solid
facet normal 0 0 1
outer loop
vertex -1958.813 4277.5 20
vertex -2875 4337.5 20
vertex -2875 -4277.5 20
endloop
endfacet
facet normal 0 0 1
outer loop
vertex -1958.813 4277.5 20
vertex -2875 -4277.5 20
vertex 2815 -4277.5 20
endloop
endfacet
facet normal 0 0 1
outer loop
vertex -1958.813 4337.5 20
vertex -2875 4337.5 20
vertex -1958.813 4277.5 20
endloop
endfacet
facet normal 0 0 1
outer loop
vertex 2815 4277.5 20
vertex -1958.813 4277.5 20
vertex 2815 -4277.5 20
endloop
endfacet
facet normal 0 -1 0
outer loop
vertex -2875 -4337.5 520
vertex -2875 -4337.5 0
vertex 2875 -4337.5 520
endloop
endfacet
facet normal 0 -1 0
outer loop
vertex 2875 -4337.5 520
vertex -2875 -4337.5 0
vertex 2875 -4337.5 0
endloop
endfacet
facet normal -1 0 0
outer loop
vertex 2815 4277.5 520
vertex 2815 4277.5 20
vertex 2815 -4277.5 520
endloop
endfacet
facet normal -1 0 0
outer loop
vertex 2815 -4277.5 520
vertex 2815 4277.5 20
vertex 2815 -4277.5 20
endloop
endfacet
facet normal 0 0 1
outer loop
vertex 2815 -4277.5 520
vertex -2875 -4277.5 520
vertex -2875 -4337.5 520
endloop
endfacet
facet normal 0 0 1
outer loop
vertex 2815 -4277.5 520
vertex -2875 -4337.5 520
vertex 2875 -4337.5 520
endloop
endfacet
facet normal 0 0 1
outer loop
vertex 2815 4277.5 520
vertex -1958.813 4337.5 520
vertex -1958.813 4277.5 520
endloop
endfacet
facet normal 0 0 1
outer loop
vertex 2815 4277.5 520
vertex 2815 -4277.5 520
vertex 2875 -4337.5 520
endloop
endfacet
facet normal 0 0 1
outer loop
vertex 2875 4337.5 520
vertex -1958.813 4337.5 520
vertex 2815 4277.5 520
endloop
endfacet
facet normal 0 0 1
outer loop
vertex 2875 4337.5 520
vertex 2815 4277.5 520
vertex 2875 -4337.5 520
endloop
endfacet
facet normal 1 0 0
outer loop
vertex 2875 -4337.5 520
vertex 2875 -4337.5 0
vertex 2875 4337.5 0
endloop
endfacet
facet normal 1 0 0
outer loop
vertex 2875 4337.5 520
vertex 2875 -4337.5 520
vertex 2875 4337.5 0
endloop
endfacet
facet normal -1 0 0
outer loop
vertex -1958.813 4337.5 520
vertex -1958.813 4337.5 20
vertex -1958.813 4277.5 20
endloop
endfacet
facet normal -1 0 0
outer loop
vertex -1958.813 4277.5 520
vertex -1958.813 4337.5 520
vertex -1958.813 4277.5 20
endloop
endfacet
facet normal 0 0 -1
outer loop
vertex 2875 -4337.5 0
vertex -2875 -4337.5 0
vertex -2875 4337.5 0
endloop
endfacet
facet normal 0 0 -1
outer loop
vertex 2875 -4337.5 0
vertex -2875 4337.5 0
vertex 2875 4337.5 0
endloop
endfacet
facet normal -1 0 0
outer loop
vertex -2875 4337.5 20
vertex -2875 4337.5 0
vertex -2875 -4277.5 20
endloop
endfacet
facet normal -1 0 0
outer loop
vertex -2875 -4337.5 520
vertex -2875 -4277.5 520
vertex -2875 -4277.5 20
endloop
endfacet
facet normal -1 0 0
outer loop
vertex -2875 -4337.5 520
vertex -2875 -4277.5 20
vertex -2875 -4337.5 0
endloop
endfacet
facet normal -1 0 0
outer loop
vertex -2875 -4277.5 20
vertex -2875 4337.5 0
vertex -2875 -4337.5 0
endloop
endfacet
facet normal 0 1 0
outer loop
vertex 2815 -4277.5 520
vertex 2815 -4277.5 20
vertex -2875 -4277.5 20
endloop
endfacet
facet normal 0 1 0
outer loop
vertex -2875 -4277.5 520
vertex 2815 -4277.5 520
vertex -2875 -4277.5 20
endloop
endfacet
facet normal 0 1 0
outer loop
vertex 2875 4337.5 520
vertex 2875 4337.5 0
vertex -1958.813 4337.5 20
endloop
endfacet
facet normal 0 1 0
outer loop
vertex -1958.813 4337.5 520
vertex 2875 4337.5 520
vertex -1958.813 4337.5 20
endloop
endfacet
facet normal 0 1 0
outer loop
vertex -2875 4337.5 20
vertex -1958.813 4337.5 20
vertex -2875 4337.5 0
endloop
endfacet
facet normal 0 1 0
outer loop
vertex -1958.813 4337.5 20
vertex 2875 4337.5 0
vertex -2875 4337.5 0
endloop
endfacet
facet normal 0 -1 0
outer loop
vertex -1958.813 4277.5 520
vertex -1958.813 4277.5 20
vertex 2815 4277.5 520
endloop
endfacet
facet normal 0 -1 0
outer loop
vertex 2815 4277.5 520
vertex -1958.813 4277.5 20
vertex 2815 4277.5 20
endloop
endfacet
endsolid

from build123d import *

# Parameters (mm, degrees)
F1_DEPTH = 20
F3_DEPTH = 500


with BuildPart() as f1:
    # F0 (on Top) → F1 (new body)
    with BuildSketch(Plane.XY):
        Polygon((-2215, 4337.5), (-2875, 4337.5), (-2875, 3543.10894), align=None)
        Polygon((2875, 4337.5), (-2215, 4337.5), (-2875, 3543.10894), (-2875, -4337.5), (2875, -4337.5), align=None)
    extrude(amount=F1_DEPTH)

    # F2 (on face) → F3 (join)
    with BuildSketch(Plane.XY.offset(20)):
        Polygon((2875, 4337.5), (-1958.812952, 4337.5), (-1958.812952, 4277.5), (2815, 4277.5), (2815, -4277.5), (-2875, -4277.5), (-2875, -4337.5), (2875, -4337.5), align=None)
    extrude(amount=F3_DEPTH)


solid = f1.part
